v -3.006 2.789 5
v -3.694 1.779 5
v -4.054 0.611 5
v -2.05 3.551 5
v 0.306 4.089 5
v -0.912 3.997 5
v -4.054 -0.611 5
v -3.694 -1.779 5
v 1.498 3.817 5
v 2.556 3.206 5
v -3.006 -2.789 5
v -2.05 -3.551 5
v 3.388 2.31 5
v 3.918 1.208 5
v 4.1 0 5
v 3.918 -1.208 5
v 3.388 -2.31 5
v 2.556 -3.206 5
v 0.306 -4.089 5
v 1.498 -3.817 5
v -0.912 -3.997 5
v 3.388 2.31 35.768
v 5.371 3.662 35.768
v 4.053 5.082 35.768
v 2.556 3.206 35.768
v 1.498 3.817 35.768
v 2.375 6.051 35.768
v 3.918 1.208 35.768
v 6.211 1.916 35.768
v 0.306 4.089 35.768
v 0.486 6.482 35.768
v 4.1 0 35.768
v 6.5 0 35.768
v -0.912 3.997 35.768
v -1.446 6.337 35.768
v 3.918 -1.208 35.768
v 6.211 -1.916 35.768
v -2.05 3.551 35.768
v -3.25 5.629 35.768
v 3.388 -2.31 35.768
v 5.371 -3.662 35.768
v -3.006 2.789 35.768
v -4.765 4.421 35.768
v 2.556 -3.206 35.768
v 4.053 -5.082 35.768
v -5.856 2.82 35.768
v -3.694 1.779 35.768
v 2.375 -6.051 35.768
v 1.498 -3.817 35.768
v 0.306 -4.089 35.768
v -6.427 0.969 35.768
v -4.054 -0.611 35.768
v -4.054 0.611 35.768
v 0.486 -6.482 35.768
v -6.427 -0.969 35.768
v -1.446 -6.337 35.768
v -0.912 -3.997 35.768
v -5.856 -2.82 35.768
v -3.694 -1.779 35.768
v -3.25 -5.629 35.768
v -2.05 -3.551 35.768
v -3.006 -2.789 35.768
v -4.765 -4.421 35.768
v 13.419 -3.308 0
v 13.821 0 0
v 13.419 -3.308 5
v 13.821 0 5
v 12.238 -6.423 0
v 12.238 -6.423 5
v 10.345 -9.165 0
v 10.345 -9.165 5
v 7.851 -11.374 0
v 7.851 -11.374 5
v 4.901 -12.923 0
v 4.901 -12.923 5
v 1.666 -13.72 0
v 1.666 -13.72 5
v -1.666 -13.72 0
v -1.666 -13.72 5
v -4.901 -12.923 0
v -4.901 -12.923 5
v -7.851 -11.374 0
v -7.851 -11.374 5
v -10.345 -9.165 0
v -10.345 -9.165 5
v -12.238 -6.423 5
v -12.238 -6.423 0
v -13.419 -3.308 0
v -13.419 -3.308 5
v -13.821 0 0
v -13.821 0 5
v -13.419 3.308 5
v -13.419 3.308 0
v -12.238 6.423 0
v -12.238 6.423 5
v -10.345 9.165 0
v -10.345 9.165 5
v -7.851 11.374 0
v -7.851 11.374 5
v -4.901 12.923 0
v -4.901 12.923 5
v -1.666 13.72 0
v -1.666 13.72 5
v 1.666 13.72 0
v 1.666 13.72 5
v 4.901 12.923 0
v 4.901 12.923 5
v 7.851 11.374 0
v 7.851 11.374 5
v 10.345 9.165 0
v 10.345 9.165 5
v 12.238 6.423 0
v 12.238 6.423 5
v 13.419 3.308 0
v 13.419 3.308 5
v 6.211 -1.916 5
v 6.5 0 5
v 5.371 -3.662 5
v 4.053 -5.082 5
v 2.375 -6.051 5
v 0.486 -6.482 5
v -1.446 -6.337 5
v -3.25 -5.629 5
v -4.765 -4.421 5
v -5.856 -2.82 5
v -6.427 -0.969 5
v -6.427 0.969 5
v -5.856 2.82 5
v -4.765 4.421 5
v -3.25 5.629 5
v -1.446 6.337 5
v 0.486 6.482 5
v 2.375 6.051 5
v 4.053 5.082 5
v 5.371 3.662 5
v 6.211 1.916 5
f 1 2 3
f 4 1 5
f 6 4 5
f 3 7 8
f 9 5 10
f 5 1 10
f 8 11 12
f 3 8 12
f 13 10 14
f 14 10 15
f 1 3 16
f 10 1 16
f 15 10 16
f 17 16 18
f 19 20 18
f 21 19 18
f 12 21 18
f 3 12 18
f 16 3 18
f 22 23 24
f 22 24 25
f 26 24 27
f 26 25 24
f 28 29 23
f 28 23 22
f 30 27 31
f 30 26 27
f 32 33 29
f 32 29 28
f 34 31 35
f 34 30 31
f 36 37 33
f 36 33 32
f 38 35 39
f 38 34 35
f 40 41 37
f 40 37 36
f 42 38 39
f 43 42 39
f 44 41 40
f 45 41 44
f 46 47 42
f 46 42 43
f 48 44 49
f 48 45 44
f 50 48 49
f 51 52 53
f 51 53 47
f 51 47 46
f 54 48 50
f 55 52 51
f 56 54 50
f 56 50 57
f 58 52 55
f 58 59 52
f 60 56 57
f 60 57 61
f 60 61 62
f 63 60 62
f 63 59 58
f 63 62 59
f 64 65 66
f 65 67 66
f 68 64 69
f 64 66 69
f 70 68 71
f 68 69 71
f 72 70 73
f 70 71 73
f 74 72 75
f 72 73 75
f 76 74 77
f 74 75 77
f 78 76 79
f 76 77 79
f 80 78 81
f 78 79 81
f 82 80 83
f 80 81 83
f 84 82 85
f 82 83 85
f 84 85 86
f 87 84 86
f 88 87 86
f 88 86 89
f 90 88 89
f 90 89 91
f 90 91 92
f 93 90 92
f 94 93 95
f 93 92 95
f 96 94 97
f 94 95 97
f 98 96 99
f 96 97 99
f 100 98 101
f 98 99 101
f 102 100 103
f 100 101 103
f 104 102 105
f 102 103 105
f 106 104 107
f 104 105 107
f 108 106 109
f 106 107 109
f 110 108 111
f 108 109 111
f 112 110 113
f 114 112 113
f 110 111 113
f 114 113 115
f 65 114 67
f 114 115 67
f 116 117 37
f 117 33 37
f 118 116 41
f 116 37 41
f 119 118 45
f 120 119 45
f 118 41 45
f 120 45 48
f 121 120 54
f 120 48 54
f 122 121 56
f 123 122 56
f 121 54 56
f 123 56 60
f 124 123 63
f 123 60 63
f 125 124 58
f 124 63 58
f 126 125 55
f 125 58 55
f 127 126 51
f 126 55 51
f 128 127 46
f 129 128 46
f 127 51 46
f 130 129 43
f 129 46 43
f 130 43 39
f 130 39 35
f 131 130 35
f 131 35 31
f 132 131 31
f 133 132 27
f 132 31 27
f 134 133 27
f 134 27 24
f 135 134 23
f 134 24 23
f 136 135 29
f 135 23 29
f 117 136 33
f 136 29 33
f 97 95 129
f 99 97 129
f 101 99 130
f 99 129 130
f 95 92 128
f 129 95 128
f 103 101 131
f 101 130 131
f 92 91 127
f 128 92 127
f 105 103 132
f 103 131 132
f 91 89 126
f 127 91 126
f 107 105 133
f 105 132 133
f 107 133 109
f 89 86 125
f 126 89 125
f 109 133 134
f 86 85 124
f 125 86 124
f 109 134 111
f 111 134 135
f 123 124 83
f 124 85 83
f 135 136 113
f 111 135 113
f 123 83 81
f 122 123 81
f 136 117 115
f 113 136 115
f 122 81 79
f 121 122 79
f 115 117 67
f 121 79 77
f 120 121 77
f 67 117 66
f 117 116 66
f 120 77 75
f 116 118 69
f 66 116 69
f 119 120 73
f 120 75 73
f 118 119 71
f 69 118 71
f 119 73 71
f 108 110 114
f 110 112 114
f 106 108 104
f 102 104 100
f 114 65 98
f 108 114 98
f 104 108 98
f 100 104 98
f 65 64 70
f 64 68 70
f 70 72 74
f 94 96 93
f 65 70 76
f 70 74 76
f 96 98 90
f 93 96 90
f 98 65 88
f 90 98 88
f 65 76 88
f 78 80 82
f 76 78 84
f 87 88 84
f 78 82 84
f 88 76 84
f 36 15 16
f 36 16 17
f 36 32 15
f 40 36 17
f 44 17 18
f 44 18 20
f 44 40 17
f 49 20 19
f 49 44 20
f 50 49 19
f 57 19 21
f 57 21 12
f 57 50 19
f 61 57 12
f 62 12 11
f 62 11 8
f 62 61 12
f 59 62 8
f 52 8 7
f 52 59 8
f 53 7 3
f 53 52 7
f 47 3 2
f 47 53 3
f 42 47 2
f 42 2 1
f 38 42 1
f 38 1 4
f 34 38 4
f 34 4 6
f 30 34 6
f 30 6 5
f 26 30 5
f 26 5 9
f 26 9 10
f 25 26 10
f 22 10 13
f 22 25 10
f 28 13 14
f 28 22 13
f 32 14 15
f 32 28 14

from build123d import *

# Parameters (mm, degrees)
F0_W   = 2.4
F0_H   = 30.767596
F0_W_2 = 4.1
F0_H_2 = 5
F0_W_3 = 7.320878


with BuildPart() as f1:
    # F0 (on Front) → F1 (revolve)
    with BuildSketch(Plane.XZ):
        with Locations((5.3, 20.383798)):
            Rectangle(F0_W, F0_H)
    revolve(axis=Axis((0, 0, 17.953249), (0, 0, -1)))

    # F0 (on Front) → F2 (revolve)
    with BuildSketch(Plane.XZ):
        with Locations((2.05, 2.5)):
            Rectangle(F0_W_2, F0_H_2)
        with Locations((5.3, 2.5)):
            Rectangle(F0_W, F0_H_2)
        with Locations((10.160439, 2.5)):
            Rectangle(F0_W_3, F0_H_2)
    revolve(axis=Axis((0, 0, 2.5), (0, 0, -1)))


solid = f1.part
